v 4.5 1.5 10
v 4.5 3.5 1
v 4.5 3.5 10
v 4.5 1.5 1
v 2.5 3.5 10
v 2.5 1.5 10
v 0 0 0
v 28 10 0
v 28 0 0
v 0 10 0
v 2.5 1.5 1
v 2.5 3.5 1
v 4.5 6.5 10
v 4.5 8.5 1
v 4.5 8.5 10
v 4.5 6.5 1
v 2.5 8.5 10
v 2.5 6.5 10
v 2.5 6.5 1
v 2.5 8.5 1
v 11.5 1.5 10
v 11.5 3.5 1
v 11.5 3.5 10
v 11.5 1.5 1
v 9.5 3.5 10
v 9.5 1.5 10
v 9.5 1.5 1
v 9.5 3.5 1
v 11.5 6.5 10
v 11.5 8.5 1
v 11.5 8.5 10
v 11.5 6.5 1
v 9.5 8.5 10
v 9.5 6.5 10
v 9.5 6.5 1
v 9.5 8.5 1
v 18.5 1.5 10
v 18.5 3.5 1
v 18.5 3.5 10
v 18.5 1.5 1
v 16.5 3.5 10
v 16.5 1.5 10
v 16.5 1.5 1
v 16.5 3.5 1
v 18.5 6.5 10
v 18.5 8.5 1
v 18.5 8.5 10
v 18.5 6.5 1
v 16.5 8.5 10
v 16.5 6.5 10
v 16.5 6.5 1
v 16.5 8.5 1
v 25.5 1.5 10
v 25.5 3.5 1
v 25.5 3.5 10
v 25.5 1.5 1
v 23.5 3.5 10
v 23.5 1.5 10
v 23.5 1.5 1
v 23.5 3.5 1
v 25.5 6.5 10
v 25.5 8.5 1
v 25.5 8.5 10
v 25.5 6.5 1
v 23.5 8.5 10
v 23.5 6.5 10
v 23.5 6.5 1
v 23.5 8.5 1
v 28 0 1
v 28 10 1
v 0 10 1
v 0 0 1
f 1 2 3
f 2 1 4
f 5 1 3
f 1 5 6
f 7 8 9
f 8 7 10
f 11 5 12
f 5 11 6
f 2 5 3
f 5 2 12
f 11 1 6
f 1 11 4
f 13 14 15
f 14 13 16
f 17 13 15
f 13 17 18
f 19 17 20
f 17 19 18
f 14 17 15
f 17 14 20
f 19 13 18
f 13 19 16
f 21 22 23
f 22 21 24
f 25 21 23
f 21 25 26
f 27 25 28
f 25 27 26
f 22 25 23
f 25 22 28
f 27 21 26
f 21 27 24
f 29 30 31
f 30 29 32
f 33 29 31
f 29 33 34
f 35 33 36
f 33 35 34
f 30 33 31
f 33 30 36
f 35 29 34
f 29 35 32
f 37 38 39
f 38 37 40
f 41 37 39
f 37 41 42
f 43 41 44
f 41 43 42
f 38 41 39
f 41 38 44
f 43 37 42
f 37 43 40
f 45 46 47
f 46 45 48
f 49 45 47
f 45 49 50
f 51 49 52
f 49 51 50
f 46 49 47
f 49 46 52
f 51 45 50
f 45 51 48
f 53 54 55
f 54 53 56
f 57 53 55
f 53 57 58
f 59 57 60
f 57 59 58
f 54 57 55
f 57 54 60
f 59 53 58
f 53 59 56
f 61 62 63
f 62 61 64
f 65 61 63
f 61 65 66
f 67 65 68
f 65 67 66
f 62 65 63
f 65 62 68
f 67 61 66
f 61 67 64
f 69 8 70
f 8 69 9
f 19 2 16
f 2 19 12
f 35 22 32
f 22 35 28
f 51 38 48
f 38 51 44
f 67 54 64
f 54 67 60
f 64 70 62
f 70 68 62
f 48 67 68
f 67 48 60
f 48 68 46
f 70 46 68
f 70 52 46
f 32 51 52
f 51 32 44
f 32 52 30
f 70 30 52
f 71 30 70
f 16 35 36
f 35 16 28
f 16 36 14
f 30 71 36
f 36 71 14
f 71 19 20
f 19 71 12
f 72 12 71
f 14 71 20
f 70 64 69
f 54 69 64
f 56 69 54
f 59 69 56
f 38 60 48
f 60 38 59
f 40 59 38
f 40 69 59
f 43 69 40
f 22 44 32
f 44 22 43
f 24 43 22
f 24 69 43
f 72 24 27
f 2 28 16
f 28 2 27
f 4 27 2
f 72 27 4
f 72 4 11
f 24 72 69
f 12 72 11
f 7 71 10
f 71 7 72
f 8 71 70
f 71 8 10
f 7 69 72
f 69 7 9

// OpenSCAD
//$fn=64;

h=10;
w=2;
pitchx=7;
pitchy=5;

xn = 4;
yn = 2;

for (i = [1:xn]) { 
  for (j = [1:yn]) {
    translate([(i-0.5)*pitchx-w/2, (j-0.5)*pitchy-w/2, 0]) cube([w, w, h]);
  }
} 
cube([xn*pitchx, yn*pitchy, 1]);

//translate([-10, 0, 0]) cylinder(d=d, h=h);
//translate([10, 0, 0]) cylinder(d=d, h=h);
//translate([-30/2, -10/2, 0]) cube([30, 10, 1]);
